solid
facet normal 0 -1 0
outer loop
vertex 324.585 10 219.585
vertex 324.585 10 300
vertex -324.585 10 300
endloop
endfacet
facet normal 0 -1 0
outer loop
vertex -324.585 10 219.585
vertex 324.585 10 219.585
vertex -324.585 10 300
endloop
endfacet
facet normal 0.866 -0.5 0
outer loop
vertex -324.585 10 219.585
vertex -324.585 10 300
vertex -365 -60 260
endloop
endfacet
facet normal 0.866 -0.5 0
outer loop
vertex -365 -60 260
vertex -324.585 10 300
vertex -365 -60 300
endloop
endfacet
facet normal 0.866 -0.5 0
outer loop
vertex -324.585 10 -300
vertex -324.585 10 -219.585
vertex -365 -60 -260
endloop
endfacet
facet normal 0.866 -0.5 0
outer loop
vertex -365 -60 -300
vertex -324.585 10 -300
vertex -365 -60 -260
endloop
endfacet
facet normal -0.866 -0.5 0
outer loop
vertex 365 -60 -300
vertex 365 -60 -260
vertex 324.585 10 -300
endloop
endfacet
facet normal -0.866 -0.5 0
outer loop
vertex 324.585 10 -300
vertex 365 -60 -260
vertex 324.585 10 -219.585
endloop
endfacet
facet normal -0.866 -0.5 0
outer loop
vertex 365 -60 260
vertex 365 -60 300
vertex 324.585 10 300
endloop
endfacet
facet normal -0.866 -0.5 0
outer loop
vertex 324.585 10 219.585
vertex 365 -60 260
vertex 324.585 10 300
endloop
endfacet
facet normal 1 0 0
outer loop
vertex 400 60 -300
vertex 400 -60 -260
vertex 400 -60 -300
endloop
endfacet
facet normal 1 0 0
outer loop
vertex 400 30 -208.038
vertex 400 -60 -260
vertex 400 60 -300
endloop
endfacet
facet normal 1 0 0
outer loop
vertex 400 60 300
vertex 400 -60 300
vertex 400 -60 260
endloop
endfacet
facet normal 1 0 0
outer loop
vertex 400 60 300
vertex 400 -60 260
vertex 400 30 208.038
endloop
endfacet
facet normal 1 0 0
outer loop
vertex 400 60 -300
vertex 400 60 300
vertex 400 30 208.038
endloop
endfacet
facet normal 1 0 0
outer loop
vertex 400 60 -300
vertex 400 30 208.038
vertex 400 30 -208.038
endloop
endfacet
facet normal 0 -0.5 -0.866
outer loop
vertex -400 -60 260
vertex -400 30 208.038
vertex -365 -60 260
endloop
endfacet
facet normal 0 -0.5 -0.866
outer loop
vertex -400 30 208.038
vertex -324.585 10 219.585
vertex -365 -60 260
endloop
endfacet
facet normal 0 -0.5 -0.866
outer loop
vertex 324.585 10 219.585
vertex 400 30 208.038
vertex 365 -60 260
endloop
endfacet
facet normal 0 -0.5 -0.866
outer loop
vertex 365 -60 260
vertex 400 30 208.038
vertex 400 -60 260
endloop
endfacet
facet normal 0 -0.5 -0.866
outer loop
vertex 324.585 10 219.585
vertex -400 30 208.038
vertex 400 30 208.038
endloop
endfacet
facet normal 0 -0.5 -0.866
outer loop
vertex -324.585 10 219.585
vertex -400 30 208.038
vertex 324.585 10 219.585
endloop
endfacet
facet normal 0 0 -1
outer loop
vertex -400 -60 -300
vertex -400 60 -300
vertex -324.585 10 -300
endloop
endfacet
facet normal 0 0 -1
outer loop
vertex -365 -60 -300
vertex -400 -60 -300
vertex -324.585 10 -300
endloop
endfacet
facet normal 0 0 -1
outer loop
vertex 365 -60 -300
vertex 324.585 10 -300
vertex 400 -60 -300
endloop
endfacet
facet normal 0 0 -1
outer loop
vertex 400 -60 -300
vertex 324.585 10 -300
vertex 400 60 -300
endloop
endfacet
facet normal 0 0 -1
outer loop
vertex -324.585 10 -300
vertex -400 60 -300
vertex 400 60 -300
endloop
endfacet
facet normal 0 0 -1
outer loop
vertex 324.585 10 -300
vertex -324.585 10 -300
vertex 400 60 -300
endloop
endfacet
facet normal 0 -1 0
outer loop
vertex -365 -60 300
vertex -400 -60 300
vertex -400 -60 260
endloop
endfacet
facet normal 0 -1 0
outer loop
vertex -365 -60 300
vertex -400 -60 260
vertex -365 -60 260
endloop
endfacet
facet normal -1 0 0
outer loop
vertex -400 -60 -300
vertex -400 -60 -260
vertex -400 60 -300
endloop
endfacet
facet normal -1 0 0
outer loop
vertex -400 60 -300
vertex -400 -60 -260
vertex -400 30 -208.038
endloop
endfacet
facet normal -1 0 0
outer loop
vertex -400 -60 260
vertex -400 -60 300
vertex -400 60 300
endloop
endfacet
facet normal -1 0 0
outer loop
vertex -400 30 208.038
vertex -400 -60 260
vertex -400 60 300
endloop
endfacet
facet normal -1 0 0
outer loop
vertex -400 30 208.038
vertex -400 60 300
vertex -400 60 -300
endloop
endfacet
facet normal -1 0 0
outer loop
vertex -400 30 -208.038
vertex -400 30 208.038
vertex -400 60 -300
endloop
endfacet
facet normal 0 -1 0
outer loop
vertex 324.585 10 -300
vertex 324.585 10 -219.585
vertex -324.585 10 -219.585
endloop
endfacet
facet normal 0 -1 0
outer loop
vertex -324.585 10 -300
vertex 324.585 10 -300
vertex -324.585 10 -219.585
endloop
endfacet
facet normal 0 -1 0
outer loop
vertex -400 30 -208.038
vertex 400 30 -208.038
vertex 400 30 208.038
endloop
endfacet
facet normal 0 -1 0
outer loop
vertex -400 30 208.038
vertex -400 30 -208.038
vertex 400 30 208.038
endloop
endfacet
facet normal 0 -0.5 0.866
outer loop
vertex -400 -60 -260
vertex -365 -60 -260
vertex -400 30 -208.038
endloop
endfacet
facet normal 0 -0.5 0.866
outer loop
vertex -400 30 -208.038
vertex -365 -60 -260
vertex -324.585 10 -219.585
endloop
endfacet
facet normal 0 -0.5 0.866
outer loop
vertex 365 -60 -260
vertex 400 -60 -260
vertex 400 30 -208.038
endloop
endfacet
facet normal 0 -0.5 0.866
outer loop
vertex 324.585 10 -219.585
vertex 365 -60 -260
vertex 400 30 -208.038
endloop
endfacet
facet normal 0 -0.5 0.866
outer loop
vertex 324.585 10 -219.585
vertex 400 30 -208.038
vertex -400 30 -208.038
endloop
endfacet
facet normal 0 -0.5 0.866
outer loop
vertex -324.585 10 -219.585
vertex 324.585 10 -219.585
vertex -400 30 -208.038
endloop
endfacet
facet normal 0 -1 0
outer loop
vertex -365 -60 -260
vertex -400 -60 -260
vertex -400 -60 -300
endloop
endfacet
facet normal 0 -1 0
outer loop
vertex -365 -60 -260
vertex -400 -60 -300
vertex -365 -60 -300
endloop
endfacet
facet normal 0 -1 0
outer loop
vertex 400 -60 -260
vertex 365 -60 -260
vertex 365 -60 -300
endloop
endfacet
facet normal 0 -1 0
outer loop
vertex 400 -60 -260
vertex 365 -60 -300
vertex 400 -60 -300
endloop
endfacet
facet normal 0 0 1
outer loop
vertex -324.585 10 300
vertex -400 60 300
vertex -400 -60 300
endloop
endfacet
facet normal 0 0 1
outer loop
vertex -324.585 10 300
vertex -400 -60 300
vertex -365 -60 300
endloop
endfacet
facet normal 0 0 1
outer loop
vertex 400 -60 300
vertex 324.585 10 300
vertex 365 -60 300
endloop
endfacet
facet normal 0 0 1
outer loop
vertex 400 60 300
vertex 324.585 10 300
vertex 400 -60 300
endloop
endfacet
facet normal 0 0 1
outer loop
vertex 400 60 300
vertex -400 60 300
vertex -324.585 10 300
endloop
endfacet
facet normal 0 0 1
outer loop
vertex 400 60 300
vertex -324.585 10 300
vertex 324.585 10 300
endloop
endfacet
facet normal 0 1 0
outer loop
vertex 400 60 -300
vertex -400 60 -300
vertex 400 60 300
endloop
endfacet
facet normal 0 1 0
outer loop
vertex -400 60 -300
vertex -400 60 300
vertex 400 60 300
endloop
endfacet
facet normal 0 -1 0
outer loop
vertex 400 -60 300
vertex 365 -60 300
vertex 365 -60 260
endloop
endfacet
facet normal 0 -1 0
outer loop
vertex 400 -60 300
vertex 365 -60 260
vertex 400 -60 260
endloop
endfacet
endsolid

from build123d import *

# Parameters (mm, degrees)
CROQUIS1_W              = 800
CROQUIS1_H              = 120
SALIENTE_EXTRUIR1_DEPTH = 300
CORTAR_EXTRUIR1_DEPTH   = 857.504524215
CORTAR_EXTRUIR2_DEPTH   = 600


with BuildPart() as part:
    # Croquis1 → Saliente-Extruir1 (new, symmetric)
    with BuildSketch(Plane.XY):
        Rectangle(CROQUIS1_W, CROQUIS1_H)
    extrude(amount=SALIENTE_EXTRUIR1_DEPTH, both=True)

    # Croquis2 → Cortar-Extruir1 (cut, through all)
    with BuildSketch(Plane(origin=(400, 0, 0), x_dir=(0, 0, -1), z_dir=(1, 0, 0))):
        Polygon((-208.038475773, 30), (-260, -60), (0, -60), (0, 30), align=None)
        Polygon((0, 30), (0, -60), (260, -60), (208.038475773, 30), align=None)
    extrude(amount=-CORTAR_EXTRUIR1_DEPTH, mode=Mode.SUBTRACT)

    # Croquis3 → Cortar-Extruir2 (cut)
    with BuildSketch(Plane.XY.offset(300)):
        Polygon((-324.585481157, 10), (-365, -60), (0, -60), (0, 10), align=None)
        Polygon((0, 10), (0, -60), (365, -60), (324.585481157, 10), align=None)
    extrude(amount=-CORTAR_EXTRUIR2_DEPTH, mode=Mode.SUBTRACT)


solid = part.part
